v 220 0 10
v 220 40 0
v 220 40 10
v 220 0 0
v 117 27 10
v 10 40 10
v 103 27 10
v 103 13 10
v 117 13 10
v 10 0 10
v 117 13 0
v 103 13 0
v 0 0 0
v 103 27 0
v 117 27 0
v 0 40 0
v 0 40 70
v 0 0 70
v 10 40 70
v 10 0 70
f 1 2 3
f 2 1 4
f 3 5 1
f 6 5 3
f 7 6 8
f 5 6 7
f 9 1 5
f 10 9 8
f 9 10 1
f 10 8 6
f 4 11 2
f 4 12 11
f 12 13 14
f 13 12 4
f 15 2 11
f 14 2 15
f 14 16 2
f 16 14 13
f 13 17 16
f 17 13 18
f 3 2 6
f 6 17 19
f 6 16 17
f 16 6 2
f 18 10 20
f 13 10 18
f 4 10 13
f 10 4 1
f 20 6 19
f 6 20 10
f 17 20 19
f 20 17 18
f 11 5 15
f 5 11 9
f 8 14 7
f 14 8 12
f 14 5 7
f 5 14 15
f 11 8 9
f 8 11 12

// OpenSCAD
$fn = 32;

// ----------------------------------------------------------------------
// Gantry bracket: 200-250 mm L bracket
// ----------------------------------------------------------------------

// --- parameters (mm) ---
base_l = 220;             // base arm length, X
arm_w = 40;               // arm width, Y
thick = 10;               // arm thickness
up_h = 60;                // vertical arm height, Z
slot_w = 14;              // adjustment slot width in the base
fit_tol = 0.05;           // tolerance for press fits, mm
free_tol = 0.3;           // tolerance for clearance fits, mm

total_h = up_h + thick;  // overall height

difference() {
  union() {
    cube([base_l, arm_w, thick]);
    cube([thick, arm_w, total_h]);
  }
  translate([base_l / 2 - slot_w / 2, arm_w / 2 - slot_w / 2, -1])
    cube([slot_w, slot_w, thick + 2]);
}
